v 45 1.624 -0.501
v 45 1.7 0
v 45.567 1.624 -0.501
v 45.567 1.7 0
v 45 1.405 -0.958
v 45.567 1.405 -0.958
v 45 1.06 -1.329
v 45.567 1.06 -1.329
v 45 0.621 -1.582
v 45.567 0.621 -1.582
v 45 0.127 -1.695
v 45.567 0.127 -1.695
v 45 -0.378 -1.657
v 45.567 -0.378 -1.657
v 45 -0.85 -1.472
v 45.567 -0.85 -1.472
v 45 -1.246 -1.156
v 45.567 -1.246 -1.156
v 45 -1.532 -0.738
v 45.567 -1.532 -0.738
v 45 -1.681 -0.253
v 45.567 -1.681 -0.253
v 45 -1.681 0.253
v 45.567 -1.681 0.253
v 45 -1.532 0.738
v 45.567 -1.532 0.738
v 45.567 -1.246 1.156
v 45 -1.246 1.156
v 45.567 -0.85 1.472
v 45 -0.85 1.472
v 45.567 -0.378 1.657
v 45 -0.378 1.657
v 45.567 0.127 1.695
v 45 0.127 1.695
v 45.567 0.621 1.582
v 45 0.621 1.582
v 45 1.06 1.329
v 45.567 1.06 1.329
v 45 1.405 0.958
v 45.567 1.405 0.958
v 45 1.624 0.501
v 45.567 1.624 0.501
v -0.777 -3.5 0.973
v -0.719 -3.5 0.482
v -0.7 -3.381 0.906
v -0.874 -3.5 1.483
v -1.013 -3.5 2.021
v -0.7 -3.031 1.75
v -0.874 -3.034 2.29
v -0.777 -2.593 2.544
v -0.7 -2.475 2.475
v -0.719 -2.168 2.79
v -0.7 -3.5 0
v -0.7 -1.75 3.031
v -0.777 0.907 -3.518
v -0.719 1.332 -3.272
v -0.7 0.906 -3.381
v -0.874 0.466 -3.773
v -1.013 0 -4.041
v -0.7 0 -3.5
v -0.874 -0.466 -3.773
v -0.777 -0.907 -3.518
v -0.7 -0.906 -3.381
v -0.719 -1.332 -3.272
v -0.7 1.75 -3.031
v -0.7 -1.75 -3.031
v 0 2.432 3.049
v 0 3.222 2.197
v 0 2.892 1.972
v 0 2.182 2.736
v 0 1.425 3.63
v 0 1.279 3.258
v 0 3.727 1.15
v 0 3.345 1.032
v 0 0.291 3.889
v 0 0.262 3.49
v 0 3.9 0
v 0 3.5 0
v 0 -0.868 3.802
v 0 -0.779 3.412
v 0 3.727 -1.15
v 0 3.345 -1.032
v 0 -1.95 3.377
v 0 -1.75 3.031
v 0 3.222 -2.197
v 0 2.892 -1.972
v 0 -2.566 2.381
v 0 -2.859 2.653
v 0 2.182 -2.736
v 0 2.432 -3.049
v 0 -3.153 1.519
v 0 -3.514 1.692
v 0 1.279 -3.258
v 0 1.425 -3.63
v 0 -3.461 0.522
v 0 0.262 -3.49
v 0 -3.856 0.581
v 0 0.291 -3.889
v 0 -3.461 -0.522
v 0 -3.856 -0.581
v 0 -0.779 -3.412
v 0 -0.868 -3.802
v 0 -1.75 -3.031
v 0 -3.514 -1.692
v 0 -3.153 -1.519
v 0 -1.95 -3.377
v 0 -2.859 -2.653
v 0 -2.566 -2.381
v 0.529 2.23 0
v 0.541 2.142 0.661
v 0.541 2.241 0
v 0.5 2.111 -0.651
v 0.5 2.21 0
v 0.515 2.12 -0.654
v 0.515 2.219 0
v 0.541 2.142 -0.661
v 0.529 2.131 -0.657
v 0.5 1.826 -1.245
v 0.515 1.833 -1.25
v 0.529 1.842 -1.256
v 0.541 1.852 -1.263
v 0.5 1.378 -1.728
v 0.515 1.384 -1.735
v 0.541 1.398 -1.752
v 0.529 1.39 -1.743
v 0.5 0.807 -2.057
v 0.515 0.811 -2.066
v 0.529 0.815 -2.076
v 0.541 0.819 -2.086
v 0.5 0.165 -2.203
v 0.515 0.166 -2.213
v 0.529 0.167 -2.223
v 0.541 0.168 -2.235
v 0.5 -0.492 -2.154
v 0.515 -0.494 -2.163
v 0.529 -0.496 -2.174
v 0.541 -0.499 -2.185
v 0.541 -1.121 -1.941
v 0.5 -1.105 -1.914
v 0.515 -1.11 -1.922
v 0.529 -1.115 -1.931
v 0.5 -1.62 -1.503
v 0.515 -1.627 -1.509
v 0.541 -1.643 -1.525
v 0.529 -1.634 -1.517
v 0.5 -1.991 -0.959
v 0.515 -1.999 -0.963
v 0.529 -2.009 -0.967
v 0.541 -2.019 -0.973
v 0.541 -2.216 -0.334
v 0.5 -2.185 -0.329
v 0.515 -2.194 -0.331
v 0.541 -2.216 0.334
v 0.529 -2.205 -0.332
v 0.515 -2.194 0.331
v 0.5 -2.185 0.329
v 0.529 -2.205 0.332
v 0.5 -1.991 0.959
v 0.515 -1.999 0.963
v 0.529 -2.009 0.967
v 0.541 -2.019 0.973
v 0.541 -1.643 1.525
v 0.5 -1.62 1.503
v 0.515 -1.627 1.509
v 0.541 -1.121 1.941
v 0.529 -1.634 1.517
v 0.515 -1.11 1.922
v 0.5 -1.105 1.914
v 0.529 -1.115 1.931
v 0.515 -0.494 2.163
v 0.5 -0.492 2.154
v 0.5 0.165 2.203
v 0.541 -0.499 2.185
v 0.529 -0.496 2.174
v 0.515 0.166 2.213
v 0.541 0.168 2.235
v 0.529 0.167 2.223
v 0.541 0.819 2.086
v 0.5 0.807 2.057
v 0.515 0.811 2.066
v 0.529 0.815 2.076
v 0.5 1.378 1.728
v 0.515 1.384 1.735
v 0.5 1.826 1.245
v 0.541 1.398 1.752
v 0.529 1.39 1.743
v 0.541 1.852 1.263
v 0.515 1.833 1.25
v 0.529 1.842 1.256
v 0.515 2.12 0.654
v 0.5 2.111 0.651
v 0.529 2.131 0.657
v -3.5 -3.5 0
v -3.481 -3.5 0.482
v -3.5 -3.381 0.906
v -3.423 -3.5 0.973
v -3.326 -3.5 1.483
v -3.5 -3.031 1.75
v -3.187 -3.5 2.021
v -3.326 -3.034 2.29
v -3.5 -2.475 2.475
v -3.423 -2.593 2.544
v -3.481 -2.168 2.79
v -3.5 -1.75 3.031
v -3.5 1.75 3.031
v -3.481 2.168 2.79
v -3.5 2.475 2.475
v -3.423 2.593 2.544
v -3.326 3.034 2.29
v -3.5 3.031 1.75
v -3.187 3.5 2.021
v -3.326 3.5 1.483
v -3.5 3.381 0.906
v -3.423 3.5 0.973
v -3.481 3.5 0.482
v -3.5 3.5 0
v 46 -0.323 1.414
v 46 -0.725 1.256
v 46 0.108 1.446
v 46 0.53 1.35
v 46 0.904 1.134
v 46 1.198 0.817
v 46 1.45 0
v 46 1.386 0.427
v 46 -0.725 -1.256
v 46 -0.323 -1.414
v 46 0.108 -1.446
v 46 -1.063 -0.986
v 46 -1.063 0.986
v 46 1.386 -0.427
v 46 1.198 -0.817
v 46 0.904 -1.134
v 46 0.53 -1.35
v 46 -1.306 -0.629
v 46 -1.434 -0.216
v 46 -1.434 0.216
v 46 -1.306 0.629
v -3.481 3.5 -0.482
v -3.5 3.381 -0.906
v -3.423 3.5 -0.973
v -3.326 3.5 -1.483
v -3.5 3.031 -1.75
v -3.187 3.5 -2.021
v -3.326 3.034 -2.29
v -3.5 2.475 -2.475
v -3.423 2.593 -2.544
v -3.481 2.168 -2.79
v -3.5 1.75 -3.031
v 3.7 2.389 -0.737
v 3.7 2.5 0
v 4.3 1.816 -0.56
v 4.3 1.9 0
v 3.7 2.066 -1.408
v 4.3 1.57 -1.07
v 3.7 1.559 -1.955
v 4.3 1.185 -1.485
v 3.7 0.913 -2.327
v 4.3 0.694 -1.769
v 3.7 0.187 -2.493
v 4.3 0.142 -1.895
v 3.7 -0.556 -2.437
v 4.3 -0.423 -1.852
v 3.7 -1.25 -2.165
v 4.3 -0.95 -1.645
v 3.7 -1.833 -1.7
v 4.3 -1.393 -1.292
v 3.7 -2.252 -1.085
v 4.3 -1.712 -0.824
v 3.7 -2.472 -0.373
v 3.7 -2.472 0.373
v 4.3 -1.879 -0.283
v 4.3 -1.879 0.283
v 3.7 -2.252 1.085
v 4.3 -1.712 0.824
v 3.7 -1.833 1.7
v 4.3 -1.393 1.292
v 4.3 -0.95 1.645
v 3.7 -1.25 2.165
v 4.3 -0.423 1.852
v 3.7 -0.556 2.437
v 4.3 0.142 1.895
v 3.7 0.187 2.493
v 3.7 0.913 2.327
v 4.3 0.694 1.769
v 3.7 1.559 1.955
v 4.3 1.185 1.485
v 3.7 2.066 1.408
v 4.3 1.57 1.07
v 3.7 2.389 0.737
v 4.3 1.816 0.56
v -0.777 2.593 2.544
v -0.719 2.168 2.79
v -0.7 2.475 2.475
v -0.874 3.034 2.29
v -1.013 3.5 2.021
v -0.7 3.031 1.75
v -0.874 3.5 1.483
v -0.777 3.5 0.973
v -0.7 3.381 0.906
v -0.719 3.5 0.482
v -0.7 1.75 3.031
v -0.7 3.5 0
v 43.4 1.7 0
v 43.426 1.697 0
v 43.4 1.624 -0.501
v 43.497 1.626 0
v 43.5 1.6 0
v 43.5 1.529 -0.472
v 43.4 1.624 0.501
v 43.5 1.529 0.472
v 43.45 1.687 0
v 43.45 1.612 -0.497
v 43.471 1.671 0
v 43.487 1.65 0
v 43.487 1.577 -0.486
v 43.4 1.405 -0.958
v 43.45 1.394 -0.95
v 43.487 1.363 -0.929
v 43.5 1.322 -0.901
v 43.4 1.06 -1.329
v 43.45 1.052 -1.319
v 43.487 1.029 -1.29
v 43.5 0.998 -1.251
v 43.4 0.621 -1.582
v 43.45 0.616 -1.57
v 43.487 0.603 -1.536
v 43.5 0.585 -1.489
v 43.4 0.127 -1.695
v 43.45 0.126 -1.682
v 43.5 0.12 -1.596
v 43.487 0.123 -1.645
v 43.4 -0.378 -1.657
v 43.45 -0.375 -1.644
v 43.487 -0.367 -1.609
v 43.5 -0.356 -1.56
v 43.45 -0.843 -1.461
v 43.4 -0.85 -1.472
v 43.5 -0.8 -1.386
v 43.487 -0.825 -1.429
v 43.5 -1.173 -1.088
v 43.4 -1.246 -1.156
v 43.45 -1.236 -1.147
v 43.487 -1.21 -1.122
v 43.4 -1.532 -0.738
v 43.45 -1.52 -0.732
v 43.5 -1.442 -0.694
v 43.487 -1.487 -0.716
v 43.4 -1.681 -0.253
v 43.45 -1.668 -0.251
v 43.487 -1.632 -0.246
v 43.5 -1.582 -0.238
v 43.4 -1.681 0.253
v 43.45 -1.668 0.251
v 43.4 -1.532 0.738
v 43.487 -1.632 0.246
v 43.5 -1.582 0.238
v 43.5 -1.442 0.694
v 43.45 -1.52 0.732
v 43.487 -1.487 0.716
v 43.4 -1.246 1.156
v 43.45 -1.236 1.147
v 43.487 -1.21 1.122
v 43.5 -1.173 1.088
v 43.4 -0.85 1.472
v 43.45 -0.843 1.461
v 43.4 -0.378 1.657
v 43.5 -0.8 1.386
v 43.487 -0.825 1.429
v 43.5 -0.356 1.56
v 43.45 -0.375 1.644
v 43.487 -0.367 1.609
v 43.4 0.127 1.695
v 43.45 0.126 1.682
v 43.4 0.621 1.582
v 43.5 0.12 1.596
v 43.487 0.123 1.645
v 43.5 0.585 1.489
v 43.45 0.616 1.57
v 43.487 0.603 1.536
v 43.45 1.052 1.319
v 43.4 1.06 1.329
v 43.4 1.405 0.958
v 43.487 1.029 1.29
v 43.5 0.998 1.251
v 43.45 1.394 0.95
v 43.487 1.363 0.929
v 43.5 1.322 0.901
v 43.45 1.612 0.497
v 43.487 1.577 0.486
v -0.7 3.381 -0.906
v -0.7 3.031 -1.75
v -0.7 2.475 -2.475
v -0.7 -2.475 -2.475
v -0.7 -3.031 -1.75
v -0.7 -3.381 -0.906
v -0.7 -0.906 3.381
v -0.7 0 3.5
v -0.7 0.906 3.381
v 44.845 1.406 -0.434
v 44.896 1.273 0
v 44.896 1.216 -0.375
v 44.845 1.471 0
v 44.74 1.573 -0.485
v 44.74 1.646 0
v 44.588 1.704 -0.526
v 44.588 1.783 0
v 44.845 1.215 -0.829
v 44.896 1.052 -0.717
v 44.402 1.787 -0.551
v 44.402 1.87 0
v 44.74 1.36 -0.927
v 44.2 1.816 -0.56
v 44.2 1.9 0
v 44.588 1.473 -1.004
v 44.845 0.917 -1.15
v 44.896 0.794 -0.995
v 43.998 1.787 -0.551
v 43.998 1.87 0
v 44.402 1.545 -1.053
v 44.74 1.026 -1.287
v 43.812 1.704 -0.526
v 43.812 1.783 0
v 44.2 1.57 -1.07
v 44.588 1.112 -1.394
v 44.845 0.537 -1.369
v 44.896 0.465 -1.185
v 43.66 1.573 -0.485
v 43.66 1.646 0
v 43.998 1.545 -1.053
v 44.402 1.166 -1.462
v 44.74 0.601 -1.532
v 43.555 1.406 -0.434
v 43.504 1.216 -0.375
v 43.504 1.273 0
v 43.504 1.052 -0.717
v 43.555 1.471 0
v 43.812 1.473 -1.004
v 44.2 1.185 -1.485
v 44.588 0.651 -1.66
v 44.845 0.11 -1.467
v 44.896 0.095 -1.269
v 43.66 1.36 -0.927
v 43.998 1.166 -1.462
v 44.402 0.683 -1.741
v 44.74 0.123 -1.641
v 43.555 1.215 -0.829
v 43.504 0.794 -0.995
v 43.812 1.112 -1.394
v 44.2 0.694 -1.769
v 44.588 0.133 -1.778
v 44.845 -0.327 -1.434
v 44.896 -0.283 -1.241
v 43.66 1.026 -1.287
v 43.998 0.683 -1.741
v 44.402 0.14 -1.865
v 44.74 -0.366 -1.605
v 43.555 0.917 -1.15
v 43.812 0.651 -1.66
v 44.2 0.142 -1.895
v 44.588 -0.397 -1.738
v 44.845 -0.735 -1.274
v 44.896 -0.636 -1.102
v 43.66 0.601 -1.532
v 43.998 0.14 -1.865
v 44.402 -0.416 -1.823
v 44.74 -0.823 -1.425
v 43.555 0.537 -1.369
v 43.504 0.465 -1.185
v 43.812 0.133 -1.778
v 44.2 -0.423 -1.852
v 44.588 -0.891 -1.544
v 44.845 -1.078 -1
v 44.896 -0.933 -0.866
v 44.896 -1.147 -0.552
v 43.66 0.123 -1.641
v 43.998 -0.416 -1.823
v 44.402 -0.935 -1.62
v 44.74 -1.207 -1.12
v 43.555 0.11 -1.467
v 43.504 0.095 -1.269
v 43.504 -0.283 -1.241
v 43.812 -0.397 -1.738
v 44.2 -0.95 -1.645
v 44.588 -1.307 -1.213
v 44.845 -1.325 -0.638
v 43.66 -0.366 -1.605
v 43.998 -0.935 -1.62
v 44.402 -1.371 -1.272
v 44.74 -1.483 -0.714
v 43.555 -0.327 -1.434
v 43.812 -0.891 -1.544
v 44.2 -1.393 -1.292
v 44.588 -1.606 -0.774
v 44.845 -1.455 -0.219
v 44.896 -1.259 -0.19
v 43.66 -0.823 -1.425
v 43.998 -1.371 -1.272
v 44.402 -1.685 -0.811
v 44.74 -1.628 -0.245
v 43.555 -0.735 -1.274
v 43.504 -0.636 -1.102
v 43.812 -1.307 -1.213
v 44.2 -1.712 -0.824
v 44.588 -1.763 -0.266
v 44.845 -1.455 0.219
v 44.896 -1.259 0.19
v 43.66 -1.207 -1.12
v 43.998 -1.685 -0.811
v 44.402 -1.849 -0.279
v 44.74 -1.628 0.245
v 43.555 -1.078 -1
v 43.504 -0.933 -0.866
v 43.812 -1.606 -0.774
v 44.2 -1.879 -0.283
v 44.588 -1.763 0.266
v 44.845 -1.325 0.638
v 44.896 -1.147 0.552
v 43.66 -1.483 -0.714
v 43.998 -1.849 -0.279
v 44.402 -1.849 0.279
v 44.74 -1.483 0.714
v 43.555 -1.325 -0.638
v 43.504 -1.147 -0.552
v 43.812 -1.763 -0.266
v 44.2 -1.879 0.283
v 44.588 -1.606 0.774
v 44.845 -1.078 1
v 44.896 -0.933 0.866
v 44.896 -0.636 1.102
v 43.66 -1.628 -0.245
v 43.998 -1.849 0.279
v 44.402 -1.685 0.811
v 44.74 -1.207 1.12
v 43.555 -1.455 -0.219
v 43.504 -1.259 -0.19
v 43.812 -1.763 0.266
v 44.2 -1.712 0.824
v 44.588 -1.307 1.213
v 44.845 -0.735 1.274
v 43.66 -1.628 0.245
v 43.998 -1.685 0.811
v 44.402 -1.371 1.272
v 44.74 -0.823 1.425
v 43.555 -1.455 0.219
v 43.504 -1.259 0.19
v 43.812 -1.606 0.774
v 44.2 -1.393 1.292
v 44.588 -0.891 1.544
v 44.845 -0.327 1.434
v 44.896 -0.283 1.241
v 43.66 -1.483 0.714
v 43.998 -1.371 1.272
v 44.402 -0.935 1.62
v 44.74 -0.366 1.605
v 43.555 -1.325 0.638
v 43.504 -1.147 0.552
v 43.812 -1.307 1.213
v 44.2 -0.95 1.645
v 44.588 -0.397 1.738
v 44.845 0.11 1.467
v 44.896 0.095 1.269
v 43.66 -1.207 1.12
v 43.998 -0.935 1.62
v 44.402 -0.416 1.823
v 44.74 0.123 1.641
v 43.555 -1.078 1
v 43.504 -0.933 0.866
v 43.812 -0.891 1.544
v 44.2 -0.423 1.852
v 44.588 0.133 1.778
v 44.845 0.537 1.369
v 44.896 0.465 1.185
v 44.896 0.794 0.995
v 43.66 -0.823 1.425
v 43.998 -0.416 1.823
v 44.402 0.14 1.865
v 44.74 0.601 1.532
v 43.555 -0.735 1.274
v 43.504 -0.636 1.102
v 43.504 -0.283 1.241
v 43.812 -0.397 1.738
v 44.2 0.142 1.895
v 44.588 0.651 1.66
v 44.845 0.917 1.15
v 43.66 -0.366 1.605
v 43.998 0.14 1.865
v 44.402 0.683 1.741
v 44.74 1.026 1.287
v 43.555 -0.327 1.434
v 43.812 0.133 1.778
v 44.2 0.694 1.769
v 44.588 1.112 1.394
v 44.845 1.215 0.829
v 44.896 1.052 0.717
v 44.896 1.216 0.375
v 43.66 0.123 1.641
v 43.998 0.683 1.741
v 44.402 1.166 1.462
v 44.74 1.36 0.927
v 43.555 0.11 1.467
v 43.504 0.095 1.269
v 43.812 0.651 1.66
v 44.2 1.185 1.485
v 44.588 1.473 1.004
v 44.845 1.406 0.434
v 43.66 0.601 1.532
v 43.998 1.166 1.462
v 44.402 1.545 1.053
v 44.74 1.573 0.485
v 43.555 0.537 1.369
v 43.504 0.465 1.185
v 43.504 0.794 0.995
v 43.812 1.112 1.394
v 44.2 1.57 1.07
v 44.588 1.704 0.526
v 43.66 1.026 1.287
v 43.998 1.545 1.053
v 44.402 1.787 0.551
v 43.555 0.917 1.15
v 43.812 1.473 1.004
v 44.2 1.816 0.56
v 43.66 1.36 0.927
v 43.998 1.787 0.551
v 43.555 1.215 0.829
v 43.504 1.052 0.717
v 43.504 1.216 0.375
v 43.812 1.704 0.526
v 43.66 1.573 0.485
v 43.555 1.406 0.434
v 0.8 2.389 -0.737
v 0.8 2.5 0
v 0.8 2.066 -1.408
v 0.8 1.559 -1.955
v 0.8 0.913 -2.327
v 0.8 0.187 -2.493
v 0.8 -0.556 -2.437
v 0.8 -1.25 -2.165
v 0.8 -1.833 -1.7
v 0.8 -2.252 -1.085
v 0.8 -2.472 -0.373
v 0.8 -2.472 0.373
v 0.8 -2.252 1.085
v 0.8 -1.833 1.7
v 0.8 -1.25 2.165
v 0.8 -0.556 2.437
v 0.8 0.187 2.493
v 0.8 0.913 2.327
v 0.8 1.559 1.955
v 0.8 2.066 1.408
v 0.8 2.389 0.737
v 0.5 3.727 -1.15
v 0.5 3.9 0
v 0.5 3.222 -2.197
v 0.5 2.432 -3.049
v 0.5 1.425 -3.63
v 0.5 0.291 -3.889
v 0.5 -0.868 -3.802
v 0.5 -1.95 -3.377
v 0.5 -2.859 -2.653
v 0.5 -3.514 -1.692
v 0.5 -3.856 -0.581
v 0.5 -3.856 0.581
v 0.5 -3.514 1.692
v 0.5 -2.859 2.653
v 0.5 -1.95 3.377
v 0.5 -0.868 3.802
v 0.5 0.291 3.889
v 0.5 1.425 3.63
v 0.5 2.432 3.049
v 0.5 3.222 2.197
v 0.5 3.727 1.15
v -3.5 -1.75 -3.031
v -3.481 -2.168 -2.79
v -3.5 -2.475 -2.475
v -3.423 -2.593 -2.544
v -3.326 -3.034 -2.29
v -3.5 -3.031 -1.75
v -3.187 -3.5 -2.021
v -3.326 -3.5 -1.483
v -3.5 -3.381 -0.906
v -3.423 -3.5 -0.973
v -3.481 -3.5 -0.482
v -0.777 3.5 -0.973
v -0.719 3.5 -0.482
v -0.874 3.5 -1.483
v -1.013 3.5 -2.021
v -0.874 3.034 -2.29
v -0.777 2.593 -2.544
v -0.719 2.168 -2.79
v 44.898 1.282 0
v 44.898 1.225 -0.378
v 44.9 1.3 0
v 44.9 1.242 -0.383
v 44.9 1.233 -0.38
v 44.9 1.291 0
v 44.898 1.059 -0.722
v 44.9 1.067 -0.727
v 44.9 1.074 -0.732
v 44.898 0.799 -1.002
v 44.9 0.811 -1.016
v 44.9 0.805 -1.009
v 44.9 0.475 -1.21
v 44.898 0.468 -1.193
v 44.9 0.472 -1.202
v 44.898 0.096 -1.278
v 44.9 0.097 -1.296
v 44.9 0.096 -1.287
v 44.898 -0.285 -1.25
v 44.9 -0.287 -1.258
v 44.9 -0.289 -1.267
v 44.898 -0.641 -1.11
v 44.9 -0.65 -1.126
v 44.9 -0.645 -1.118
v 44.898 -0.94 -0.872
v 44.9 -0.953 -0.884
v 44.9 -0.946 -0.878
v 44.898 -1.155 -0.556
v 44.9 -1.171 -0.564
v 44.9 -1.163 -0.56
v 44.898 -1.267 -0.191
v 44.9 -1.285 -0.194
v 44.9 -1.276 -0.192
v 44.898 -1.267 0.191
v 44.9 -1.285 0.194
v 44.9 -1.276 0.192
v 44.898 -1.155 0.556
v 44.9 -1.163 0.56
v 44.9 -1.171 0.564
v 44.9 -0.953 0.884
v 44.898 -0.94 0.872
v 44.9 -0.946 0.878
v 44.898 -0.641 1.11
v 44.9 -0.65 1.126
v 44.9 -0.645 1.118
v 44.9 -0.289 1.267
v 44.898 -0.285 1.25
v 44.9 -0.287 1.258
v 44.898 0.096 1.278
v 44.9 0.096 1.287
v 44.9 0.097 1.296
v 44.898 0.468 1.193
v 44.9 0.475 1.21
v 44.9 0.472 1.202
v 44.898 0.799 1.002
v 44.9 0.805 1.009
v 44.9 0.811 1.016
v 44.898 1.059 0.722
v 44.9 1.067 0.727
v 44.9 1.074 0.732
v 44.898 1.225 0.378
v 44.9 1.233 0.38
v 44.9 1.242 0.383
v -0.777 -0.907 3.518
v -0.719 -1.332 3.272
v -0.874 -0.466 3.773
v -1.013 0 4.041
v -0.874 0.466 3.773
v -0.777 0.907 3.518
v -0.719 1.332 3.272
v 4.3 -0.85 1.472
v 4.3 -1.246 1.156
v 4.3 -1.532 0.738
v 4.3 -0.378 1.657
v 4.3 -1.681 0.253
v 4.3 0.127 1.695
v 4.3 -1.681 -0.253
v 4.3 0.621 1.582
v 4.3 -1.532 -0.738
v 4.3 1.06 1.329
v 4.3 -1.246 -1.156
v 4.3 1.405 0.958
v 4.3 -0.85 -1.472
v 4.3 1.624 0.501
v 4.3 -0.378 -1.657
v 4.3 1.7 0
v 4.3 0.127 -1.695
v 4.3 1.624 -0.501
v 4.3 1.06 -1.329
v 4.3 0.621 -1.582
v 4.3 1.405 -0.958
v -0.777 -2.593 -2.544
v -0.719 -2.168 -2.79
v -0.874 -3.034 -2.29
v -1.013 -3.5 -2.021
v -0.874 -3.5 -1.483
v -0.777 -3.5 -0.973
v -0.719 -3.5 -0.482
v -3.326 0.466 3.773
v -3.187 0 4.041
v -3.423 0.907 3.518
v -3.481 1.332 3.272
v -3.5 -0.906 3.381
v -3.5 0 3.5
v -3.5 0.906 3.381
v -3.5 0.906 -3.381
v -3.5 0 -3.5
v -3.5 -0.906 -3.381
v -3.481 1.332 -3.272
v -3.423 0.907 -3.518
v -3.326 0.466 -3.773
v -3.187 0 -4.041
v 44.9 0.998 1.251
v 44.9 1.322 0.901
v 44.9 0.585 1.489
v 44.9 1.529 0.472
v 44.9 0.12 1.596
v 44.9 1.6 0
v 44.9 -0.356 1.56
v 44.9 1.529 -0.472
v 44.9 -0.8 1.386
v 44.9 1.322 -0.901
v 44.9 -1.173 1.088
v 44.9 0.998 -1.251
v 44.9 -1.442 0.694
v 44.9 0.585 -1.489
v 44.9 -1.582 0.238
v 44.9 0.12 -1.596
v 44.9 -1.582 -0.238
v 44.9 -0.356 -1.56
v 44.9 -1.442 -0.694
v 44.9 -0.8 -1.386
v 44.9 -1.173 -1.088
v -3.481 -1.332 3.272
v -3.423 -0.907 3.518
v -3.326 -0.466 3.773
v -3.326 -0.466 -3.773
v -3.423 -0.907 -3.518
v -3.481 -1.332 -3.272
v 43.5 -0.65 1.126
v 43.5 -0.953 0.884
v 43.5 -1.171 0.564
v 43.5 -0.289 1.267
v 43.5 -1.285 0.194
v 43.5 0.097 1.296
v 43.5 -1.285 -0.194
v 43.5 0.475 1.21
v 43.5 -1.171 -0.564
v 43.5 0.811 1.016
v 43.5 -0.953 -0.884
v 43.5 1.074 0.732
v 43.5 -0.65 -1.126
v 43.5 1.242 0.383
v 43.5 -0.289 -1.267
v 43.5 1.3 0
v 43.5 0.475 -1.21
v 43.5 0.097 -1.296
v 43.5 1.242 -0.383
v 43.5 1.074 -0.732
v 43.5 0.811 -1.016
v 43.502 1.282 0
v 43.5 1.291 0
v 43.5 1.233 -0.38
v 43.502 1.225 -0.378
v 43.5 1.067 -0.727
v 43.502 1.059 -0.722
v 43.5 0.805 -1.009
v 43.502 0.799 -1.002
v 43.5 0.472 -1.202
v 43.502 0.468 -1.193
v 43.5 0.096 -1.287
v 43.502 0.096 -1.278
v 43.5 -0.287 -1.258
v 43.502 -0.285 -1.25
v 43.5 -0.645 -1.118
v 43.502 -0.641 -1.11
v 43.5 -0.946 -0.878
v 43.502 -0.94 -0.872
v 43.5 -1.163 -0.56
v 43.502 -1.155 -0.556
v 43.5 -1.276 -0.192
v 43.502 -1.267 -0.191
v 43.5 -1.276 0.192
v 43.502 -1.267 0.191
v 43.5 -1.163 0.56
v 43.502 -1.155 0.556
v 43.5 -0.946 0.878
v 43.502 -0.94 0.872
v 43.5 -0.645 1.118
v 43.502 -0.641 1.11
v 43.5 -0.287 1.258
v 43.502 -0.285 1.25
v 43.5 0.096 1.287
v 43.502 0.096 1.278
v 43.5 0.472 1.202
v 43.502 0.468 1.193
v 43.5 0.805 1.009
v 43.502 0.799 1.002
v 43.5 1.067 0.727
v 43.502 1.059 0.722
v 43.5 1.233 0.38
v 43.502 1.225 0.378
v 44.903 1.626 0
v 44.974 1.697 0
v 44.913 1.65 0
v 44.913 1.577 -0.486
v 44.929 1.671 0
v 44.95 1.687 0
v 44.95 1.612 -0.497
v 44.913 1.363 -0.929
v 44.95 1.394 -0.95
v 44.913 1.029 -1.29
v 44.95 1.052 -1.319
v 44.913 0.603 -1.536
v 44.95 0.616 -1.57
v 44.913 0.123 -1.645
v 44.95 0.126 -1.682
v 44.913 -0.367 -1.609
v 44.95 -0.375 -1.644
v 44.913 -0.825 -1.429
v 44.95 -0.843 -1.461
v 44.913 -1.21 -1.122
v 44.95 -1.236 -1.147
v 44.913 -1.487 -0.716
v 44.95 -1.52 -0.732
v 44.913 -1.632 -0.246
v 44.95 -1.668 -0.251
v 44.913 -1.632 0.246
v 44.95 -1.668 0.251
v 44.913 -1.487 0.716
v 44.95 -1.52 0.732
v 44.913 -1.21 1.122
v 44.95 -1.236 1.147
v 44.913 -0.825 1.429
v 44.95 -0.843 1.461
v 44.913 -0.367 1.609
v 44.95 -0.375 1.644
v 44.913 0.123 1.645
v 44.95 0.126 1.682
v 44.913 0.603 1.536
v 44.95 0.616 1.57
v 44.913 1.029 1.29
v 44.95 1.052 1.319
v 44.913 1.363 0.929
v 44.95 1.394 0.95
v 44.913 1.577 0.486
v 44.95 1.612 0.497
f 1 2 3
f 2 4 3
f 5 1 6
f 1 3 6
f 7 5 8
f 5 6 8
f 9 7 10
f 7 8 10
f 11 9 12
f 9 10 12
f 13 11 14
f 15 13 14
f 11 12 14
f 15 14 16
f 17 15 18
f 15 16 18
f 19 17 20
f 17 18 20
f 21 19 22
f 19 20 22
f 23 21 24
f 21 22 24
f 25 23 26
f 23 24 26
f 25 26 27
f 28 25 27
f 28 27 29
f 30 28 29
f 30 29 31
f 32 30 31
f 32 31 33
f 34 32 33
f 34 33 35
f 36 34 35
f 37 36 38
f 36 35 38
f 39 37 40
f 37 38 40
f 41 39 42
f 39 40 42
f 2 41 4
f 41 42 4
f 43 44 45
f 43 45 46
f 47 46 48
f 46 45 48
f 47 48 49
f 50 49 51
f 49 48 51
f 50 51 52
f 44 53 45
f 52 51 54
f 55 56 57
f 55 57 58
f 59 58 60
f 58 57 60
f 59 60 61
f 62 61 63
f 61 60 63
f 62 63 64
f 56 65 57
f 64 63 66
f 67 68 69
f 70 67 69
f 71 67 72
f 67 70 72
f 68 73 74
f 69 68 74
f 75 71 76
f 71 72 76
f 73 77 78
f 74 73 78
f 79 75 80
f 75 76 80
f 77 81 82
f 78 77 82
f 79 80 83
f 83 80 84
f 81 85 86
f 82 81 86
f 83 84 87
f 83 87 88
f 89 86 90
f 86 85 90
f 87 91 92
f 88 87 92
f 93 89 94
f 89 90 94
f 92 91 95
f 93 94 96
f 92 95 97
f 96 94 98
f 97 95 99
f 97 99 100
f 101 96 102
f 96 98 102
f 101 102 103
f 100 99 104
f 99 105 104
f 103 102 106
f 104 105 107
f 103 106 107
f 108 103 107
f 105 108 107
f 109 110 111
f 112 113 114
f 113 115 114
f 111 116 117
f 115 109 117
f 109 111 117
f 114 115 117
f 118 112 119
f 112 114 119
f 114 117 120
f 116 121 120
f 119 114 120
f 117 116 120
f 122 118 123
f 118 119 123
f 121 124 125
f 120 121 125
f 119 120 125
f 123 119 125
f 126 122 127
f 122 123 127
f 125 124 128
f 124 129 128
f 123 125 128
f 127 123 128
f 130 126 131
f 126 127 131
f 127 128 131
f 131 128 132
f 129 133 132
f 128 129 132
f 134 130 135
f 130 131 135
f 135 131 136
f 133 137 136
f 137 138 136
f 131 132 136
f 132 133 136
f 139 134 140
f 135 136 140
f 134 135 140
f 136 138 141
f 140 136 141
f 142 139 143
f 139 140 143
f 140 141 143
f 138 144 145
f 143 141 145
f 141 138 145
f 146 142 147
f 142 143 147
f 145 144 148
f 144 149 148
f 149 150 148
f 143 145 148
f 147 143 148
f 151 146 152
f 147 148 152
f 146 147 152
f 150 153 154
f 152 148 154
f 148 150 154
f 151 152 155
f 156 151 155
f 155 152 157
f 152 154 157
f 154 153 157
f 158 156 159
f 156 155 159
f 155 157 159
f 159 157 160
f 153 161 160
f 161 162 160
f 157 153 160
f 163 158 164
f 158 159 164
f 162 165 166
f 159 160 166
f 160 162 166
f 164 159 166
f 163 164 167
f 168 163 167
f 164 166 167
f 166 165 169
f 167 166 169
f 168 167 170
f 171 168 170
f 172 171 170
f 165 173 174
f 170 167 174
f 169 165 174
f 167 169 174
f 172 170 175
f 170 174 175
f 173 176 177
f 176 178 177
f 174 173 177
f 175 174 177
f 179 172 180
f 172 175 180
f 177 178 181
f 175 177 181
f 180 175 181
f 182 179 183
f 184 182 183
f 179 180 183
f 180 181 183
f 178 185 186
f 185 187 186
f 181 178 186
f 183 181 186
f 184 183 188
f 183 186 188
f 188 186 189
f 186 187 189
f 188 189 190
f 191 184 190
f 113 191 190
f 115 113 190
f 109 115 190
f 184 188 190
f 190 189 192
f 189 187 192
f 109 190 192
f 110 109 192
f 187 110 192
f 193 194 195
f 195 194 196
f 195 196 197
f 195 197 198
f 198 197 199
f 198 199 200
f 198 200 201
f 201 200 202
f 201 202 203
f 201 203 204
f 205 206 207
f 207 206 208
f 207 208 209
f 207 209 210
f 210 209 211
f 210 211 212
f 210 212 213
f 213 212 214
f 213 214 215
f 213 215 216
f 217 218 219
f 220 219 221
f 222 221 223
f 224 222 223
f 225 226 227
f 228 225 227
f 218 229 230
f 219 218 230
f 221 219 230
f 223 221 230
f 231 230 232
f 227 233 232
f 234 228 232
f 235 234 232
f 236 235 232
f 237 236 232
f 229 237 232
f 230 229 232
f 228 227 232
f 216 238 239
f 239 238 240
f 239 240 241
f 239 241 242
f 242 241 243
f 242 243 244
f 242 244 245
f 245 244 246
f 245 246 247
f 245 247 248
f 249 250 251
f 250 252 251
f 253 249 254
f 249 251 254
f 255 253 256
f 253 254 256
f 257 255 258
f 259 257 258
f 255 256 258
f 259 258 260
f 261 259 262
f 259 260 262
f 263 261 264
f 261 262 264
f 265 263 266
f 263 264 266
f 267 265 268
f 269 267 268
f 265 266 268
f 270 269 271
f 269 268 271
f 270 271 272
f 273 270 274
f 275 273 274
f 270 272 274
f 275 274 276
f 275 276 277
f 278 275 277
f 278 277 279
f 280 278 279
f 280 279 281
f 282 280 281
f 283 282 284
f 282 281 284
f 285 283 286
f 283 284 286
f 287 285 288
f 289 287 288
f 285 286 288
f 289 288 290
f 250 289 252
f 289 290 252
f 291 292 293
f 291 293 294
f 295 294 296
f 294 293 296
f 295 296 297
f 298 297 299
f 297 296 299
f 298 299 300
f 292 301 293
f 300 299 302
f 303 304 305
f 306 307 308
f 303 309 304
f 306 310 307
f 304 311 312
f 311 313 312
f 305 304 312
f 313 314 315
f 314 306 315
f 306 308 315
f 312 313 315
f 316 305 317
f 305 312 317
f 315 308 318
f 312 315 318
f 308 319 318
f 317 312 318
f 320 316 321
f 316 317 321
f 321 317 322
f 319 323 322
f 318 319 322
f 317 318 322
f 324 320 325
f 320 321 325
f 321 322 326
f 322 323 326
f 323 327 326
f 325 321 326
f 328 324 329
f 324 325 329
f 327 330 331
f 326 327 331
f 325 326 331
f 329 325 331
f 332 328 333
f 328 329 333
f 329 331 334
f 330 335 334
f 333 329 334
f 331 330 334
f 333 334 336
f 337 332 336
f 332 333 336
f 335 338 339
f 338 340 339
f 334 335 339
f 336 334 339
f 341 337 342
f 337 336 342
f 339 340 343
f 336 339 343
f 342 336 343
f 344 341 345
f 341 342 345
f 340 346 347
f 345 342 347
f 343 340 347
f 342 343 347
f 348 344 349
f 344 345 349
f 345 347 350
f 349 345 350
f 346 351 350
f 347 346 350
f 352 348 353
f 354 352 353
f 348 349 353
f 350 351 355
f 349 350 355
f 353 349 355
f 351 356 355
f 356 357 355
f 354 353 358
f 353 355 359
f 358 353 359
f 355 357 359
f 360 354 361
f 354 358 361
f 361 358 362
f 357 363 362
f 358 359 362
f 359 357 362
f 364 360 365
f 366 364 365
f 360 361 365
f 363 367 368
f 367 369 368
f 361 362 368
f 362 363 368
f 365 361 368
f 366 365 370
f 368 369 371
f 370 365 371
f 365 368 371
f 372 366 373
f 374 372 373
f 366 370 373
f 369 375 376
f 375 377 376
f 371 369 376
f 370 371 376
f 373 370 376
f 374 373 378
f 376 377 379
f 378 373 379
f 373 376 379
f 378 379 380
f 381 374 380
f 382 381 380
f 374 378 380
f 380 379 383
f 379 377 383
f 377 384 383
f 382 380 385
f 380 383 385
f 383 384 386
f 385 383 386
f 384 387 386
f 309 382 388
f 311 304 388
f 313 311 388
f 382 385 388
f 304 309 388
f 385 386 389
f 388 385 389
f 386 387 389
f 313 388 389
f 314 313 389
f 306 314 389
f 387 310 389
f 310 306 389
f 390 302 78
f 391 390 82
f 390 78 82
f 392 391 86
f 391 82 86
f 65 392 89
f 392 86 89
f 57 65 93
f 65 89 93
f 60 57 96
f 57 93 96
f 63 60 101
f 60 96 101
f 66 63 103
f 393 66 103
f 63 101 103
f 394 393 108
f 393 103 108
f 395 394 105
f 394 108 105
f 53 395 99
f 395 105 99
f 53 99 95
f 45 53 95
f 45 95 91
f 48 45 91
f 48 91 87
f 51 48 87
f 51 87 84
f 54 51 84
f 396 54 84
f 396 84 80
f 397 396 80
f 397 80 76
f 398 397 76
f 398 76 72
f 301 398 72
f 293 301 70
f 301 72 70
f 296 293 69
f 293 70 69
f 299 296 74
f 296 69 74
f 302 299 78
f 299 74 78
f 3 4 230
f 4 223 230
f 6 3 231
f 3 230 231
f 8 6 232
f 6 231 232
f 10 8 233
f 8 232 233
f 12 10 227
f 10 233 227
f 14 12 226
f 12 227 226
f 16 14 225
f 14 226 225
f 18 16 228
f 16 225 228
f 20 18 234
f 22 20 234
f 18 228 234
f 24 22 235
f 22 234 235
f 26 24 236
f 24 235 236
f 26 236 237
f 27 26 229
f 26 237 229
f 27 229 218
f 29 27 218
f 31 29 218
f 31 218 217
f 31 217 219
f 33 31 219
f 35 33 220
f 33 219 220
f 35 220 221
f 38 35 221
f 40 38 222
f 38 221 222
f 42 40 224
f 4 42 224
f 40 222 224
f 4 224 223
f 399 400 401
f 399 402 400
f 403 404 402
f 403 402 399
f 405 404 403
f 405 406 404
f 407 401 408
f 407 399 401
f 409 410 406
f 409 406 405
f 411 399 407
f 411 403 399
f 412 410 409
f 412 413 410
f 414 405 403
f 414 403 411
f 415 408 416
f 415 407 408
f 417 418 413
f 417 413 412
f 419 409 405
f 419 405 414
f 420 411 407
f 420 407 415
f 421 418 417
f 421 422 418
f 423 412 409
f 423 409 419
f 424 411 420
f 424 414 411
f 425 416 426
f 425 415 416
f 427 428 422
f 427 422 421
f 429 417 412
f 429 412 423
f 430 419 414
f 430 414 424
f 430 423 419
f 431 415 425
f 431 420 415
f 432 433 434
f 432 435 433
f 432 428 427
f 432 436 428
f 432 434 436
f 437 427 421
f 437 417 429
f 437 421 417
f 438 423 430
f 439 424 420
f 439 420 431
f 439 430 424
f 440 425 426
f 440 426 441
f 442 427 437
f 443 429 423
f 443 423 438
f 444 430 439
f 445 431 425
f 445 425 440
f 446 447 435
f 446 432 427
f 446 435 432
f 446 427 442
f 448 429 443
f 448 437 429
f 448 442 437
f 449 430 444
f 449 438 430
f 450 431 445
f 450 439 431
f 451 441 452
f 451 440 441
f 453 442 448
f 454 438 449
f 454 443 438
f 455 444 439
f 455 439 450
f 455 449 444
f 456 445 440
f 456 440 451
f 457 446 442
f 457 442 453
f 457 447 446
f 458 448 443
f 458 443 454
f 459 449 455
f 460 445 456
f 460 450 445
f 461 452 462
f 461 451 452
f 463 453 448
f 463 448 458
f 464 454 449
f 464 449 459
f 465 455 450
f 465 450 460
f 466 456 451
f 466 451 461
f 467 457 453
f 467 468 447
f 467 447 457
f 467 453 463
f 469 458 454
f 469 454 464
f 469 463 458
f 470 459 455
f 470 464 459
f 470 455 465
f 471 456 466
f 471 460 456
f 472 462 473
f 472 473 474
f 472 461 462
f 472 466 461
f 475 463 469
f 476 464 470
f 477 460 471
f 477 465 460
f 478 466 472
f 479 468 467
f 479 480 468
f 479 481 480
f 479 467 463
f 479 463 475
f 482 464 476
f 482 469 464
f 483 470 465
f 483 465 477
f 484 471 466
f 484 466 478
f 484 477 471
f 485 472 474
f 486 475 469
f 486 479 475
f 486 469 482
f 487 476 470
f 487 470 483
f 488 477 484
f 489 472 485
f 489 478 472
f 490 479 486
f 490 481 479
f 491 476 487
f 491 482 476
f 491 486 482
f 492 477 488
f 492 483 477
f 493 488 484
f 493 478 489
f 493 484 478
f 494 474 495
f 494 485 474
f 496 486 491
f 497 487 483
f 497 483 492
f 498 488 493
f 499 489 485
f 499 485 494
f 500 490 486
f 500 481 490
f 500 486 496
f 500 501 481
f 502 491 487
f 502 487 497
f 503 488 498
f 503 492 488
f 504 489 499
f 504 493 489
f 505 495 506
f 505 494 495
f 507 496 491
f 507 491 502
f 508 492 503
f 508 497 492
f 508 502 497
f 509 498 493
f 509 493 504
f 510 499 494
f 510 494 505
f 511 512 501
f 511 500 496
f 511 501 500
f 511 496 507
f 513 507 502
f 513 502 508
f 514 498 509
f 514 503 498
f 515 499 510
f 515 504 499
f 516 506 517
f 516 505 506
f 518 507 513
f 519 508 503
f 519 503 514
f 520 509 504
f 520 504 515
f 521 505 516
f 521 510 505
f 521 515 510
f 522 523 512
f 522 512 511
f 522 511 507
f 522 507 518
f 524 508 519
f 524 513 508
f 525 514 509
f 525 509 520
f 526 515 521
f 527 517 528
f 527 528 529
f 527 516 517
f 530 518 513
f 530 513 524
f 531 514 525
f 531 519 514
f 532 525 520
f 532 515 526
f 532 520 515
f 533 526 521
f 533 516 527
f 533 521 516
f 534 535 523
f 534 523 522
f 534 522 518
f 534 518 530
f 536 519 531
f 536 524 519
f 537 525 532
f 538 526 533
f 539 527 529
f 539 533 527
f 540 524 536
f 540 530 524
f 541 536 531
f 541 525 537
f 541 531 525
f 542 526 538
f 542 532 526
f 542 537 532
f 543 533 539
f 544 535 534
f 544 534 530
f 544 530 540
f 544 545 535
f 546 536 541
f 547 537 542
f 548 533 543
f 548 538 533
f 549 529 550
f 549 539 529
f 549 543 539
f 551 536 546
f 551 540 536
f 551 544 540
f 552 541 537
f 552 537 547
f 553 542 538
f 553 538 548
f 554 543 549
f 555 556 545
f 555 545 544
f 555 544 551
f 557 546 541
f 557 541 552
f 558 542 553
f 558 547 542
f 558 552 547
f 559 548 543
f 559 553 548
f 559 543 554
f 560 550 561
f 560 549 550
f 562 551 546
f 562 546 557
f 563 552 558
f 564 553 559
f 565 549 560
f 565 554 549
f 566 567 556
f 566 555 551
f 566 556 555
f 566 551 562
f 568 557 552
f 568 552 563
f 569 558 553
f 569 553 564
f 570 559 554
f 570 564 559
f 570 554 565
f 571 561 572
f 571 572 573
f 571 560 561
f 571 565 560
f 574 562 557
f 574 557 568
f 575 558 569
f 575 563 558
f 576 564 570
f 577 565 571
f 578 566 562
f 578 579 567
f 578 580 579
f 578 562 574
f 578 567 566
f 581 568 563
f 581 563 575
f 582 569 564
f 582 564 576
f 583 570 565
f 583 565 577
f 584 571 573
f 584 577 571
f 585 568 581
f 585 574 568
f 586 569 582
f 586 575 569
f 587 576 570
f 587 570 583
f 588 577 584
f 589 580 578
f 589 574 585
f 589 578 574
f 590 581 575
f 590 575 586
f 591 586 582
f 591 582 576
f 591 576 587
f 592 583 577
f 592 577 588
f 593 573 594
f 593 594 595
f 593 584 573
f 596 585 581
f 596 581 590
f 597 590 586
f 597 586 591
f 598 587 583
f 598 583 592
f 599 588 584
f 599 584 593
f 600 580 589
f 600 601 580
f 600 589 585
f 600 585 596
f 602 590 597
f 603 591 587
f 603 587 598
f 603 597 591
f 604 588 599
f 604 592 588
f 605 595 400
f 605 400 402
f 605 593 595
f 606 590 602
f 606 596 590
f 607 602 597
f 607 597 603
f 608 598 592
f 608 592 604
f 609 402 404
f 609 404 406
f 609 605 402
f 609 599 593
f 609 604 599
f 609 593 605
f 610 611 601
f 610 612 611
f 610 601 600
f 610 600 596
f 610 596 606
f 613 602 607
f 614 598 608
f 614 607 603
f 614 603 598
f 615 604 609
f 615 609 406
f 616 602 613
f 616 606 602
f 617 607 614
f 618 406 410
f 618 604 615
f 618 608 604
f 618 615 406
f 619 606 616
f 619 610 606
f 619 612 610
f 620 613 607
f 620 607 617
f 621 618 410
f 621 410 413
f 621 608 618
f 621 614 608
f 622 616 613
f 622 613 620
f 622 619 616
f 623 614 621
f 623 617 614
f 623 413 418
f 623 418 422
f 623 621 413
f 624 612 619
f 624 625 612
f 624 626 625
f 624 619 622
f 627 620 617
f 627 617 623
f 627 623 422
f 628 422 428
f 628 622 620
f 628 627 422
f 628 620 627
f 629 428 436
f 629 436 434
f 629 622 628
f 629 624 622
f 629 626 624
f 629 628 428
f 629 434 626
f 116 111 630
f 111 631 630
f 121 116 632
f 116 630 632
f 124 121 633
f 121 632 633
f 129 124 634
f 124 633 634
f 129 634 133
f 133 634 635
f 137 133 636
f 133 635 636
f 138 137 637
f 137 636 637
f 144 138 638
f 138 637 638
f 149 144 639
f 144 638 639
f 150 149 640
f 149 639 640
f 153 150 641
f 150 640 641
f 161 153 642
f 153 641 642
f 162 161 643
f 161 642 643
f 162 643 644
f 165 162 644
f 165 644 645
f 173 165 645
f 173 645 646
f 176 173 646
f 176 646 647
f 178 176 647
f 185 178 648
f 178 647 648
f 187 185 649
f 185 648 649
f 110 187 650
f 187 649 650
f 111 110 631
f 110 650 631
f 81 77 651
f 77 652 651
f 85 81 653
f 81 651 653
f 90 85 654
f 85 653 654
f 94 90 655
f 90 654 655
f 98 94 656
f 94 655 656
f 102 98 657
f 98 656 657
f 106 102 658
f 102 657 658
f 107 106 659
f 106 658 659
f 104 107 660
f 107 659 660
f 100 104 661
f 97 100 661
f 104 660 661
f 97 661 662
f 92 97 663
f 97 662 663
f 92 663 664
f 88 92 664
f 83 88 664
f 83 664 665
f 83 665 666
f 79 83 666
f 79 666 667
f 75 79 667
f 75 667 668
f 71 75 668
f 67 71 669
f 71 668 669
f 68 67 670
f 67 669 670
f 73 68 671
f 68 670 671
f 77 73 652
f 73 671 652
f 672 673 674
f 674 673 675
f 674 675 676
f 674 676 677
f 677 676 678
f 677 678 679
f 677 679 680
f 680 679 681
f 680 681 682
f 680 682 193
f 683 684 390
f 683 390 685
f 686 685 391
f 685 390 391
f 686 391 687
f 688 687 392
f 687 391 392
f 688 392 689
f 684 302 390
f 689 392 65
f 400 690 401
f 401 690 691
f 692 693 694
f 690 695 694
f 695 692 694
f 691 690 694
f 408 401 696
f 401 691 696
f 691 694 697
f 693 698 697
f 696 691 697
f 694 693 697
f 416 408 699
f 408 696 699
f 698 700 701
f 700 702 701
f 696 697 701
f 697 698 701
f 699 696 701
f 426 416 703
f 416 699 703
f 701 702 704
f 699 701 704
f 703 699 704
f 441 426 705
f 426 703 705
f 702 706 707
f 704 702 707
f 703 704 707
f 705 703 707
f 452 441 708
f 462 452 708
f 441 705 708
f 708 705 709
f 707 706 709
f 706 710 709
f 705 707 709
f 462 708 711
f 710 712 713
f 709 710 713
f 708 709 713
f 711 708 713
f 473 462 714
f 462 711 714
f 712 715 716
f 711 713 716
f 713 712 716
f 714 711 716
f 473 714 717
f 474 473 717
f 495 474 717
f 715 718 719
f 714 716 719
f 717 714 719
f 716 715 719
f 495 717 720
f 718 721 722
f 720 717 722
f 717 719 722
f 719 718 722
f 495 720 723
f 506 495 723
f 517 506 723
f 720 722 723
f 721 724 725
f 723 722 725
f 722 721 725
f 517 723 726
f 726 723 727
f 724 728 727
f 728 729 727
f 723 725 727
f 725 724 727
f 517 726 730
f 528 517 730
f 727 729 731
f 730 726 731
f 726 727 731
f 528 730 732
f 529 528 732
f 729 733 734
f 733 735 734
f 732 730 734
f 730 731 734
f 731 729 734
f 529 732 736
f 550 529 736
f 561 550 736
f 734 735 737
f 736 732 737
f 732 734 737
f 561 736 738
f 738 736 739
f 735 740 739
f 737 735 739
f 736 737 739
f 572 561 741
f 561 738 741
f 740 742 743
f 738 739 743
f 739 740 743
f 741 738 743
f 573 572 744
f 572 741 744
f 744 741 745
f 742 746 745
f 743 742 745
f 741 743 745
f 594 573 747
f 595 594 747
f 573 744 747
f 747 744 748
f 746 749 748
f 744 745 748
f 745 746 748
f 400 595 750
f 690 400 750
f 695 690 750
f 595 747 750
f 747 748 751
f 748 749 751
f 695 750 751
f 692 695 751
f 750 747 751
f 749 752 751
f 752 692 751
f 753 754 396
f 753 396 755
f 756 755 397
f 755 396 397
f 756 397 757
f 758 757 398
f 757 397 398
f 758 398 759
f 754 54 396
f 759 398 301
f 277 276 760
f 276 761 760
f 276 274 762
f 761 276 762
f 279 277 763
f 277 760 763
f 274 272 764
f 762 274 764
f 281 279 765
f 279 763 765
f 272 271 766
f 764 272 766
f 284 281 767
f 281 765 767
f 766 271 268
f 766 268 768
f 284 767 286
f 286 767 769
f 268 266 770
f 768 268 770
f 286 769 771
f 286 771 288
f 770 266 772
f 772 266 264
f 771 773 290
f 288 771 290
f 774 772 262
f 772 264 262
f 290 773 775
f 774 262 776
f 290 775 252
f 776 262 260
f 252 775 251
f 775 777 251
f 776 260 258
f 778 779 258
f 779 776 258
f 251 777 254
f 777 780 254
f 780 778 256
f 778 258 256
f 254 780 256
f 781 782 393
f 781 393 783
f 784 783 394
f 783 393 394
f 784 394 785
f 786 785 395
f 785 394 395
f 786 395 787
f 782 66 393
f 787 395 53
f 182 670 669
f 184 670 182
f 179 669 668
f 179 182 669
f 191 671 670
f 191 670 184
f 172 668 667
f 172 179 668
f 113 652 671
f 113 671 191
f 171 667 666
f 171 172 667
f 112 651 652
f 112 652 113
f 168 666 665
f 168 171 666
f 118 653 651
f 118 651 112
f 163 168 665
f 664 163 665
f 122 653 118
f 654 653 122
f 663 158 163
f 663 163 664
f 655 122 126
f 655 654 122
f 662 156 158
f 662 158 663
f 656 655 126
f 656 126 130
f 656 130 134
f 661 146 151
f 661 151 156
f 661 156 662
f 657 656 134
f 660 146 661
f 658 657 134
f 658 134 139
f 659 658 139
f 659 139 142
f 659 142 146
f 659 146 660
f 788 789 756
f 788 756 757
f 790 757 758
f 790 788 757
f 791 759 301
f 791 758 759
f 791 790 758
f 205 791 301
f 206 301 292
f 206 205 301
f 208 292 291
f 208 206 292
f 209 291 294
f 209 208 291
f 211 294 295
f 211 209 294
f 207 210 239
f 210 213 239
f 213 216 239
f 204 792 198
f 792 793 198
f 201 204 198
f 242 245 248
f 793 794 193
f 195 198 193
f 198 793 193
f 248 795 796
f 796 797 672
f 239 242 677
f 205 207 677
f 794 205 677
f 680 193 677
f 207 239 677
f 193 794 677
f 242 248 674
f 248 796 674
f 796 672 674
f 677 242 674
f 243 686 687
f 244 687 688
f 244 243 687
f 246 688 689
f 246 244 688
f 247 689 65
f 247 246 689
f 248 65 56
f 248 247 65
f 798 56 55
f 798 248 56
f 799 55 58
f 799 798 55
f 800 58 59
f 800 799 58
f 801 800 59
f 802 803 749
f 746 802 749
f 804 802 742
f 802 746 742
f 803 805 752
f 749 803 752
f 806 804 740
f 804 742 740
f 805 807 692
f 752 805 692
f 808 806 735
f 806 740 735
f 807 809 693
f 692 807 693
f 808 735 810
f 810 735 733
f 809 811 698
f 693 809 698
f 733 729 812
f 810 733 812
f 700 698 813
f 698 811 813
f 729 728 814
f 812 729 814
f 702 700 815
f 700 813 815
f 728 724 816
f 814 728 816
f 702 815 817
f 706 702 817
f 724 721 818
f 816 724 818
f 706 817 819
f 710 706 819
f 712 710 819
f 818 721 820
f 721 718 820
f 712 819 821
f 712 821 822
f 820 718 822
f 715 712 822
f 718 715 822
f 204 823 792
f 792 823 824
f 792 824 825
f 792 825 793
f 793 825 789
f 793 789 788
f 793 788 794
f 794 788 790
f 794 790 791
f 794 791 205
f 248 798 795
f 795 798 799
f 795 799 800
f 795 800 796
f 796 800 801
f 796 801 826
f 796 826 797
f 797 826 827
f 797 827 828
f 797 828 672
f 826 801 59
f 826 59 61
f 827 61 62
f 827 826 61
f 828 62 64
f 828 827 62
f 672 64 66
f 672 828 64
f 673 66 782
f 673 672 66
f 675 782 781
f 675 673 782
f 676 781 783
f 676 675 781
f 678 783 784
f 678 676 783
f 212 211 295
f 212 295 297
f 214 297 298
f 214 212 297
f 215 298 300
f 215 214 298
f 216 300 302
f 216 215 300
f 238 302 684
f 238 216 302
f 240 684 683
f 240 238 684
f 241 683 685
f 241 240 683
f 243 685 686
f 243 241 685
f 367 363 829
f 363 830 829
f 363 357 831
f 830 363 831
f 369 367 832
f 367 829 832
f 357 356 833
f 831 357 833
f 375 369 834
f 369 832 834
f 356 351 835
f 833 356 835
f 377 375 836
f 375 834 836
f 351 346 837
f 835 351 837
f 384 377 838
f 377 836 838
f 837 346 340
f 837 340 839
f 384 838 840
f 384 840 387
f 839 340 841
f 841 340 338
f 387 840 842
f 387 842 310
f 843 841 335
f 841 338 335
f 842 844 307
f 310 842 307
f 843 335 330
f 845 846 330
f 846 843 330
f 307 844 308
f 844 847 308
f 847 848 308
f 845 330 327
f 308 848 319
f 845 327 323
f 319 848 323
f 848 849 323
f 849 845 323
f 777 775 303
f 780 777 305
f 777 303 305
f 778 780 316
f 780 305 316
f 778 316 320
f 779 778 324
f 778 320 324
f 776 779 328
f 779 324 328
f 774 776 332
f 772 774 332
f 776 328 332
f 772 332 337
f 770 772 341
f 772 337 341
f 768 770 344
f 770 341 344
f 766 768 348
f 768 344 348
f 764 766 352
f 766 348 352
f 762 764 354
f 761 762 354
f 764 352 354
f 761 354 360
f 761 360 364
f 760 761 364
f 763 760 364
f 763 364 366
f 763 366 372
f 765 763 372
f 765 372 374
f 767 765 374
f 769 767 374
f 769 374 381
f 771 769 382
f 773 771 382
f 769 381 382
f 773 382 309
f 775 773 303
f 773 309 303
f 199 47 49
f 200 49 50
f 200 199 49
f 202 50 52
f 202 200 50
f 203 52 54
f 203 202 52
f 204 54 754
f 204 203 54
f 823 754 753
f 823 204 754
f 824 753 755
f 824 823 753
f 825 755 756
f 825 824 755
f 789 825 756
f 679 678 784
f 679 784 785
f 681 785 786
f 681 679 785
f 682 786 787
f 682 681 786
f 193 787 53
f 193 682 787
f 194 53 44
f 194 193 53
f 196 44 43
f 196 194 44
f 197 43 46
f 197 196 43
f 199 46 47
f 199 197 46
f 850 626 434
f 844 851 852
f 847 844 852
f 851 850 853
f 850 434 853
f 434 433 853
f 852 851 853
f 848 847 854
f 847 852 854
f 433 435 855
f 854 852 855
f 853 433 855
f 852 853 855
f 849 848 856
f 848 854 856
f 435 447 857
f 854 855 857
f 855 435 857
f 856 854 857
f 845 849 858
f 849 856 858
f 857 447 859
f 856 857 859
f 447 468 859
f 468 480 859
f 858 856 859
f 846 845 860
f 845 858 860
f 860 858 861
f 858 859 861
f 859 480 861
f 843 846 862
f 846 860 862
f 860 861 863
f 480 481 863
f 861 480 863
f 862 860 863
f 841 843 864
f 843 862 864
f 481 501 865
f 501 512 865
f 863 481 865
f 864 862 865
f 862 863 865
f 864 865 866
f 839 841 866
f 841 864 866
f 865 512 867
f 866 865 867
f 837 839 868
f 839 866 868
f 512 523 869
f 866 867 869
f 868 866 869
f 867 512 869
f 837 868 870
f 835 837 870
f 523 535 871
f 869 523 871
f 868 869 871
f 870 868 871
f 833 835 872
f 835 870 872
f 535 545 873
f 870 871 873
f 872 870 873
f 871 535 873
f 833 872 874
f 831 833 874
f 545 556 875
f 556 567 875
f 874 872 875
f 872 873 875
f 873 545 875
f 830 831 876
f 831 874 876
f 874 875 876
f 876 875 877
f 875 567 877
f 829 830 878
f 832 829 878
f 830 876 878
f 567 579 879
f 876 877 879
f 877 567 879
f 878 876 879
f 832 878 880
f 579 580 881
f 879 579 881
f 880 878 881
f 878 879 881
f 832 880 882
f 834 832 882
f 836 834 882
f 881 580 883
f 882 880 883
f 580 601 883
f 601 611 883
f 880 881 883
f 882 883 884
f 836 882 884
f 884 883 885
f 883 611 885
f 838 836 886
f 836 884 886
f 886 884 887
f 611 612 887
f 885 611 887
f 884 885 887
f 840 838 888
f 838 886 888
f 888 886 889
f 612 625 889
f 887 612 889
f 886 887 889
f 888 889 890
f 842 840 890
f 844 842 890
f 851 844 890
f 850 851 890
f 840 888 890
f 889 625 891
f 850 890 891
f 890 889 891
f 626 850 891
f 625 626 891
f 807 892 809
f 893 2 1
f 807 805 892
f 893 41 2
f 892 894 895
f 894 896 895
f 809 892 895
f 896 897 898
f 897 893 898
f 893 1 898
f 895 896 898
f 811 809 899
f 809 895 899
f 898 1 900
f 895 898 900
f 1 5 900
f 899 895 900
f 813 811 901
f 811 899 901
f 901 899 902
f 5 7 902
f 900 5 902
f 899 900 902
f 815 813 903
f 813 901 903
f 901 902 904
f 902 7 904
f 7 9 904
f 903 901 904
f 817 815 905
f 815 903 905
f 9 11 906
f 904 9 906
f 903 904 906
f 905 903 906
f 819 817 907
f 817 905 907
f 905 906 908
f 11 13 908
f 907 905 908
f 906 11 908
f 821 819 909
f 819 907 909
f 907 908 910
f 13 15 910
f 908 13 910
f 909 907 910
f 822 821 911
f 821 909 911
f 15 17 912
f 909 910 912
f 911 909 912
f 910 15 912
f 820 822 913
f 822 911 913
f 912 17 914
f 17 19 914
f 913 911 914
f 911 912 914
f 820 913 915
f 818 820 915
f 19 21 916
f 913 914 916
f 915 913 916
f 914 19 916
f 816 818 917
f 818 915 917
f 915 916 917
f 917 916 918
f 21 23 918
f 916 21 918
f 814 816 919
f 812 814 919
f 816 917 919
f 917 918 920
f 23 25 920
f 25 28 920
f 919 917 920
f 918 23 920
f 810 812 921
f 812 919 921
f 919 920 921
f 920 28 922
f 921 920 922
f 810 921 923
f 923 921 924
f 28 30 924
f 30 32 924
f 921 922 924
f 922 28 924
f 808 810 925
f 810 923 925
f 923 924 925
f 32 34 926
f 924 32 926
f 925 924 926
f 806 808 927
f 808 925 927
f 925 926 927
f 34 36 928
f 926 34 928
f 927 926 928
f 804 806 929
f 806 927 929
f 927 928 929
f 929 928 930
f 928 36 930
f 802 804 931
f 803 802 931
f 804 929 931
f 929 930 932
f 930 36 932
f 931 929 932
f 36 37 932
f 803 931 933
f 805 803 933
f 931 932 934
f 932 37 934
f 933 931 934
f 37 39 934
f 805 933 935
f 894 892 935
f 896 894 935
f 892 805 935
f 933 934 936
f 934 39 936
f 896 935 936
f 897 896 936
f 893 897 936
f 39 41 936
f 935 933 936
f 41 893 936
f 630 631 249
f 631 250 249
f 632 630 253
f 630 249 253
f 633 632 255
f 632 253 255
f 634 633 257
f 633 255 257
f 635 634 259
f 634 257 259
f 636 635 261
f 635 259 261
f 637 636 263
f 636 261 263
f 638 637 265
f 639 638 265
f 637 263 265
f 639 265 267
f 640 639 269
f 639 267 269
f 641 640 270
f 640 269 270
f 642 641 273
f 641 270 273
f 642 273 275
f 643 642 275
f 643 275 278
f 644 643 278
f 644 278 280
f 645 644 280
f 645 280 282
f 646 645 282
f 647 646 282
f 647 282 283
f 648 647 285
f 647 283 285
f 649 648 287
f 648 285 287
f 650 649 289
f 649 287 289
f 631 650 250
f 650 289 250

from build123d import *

# Parameters (mm, degrees)
SKETCH2_W          = 20
SKETCH2_H          = 20
CUT_EXTRUDE1_DEPTH = 5
SKETCH4_W          = 0.5
SKETCH4_H          = 1.75


with BuildPart() as part:
    # Sketch1 → Revolve1 (revolve)
    with BuildSketch(Plane.XY):
        with BuildLine():
            Line((-3.5, 0), (-3.5, 3.5))
            Line((-3.5, 3.5), (-2.1, 5.924871131))
            Line((-2.1, 5.924871131), (-0.7, 3.5))
            Line((-0.7, 3.5), (0, 3.5))
            Line((0, 3.5), (0, 2.5))
            Line((0, 2.5), (0.258578644, 2.241421356))
            ThreePointArc((0.258578644, 2.241421356), (0.4, 2.182842712), (0.541421356, 2.241421356))
            Line((0.541421356, 2.241421356), (0.8, 2.5))
            Line((0.8, 2.5), (3.7, 2.5))
            Line((3.7, 2.5), (4.3, 1.9))
            Line((4.3, 1.9), (4.3, 1.7))
            Line((4.3, 1.7), (43.4, 1.7))
            ThreePointArc((43.4, 1.7), (43.470710678, 1.670710678), (43.5, 1.6))
            Line((43.5, 1.6), (43.5, 1.3))
            ThreePointArc((43.5, 1.3), (43.529289322, 1.229289322), (43.6, 1.2))
            Line((43.6, 1.2), (44.8, 1.2))
            ThreePointArc((44.8, 1.2), (44.870710678, 1.229289322), (44.9, 1.3))
            Line((44.9, 1.3), (44.9, 1.6))
            ThreePointArc((44.9, 1.6), (44.929289322, 1.670710678), (45, 1.7))
            Line((45, 1.7), (45.566987298, 1.7))
            Line((45.566987298, 1.7), (46, 1.45))
            Line((46, 1.45), (46, 0))
            Line((46, 0), (-3.5, 0))
        make_face()
    revolve(axis=Axis((46, 0, 0), (-1, 0, 0)))

    # Sketch2 → Cut-Extrude1 (cut)
    with BuildSketch(Plane.ZY.offset(3.5)):
        Rectangle(SKETCH2_W, SKETCH2_H)
        Polygon((2.020725942, -3.5), (4.041451884, 0), (2.020725942, 3.5), (-2.020725942, 3.5), (-4.041451884, 0), (-2.020725942, -3.5), align=None, mode=Mode.SUBTRACT)
    extrude(amount=-CUT_EXTRUDE1_DEPTH, mode=Mode.SUBTRACT)

    # Sketch3 → Revolve2 (revolve)
    with BuildSketch(Plane.XY):
        with BuildLine():
            Line((43.5, 1.2), (44.9, 1.2))
            ThreePointArc((44.9, 1.2), (44.2, 1.9), (43.5, 1.2))
        make_face()
    revolve(axis=Axis((44.9, 0, 0), (-1, 0, 0)))

    # Sketch4 → Revolve3 (revolve)
    with BuildSketch(Plane.XY):
        with Locations((0.25, 3.025)):
            Rectangle(SKETCH4_W, SKETCH4_H)
    revolve(axis=Axis((0.5, 0, 0), (-1, 0, 0)))


solid = part.part
